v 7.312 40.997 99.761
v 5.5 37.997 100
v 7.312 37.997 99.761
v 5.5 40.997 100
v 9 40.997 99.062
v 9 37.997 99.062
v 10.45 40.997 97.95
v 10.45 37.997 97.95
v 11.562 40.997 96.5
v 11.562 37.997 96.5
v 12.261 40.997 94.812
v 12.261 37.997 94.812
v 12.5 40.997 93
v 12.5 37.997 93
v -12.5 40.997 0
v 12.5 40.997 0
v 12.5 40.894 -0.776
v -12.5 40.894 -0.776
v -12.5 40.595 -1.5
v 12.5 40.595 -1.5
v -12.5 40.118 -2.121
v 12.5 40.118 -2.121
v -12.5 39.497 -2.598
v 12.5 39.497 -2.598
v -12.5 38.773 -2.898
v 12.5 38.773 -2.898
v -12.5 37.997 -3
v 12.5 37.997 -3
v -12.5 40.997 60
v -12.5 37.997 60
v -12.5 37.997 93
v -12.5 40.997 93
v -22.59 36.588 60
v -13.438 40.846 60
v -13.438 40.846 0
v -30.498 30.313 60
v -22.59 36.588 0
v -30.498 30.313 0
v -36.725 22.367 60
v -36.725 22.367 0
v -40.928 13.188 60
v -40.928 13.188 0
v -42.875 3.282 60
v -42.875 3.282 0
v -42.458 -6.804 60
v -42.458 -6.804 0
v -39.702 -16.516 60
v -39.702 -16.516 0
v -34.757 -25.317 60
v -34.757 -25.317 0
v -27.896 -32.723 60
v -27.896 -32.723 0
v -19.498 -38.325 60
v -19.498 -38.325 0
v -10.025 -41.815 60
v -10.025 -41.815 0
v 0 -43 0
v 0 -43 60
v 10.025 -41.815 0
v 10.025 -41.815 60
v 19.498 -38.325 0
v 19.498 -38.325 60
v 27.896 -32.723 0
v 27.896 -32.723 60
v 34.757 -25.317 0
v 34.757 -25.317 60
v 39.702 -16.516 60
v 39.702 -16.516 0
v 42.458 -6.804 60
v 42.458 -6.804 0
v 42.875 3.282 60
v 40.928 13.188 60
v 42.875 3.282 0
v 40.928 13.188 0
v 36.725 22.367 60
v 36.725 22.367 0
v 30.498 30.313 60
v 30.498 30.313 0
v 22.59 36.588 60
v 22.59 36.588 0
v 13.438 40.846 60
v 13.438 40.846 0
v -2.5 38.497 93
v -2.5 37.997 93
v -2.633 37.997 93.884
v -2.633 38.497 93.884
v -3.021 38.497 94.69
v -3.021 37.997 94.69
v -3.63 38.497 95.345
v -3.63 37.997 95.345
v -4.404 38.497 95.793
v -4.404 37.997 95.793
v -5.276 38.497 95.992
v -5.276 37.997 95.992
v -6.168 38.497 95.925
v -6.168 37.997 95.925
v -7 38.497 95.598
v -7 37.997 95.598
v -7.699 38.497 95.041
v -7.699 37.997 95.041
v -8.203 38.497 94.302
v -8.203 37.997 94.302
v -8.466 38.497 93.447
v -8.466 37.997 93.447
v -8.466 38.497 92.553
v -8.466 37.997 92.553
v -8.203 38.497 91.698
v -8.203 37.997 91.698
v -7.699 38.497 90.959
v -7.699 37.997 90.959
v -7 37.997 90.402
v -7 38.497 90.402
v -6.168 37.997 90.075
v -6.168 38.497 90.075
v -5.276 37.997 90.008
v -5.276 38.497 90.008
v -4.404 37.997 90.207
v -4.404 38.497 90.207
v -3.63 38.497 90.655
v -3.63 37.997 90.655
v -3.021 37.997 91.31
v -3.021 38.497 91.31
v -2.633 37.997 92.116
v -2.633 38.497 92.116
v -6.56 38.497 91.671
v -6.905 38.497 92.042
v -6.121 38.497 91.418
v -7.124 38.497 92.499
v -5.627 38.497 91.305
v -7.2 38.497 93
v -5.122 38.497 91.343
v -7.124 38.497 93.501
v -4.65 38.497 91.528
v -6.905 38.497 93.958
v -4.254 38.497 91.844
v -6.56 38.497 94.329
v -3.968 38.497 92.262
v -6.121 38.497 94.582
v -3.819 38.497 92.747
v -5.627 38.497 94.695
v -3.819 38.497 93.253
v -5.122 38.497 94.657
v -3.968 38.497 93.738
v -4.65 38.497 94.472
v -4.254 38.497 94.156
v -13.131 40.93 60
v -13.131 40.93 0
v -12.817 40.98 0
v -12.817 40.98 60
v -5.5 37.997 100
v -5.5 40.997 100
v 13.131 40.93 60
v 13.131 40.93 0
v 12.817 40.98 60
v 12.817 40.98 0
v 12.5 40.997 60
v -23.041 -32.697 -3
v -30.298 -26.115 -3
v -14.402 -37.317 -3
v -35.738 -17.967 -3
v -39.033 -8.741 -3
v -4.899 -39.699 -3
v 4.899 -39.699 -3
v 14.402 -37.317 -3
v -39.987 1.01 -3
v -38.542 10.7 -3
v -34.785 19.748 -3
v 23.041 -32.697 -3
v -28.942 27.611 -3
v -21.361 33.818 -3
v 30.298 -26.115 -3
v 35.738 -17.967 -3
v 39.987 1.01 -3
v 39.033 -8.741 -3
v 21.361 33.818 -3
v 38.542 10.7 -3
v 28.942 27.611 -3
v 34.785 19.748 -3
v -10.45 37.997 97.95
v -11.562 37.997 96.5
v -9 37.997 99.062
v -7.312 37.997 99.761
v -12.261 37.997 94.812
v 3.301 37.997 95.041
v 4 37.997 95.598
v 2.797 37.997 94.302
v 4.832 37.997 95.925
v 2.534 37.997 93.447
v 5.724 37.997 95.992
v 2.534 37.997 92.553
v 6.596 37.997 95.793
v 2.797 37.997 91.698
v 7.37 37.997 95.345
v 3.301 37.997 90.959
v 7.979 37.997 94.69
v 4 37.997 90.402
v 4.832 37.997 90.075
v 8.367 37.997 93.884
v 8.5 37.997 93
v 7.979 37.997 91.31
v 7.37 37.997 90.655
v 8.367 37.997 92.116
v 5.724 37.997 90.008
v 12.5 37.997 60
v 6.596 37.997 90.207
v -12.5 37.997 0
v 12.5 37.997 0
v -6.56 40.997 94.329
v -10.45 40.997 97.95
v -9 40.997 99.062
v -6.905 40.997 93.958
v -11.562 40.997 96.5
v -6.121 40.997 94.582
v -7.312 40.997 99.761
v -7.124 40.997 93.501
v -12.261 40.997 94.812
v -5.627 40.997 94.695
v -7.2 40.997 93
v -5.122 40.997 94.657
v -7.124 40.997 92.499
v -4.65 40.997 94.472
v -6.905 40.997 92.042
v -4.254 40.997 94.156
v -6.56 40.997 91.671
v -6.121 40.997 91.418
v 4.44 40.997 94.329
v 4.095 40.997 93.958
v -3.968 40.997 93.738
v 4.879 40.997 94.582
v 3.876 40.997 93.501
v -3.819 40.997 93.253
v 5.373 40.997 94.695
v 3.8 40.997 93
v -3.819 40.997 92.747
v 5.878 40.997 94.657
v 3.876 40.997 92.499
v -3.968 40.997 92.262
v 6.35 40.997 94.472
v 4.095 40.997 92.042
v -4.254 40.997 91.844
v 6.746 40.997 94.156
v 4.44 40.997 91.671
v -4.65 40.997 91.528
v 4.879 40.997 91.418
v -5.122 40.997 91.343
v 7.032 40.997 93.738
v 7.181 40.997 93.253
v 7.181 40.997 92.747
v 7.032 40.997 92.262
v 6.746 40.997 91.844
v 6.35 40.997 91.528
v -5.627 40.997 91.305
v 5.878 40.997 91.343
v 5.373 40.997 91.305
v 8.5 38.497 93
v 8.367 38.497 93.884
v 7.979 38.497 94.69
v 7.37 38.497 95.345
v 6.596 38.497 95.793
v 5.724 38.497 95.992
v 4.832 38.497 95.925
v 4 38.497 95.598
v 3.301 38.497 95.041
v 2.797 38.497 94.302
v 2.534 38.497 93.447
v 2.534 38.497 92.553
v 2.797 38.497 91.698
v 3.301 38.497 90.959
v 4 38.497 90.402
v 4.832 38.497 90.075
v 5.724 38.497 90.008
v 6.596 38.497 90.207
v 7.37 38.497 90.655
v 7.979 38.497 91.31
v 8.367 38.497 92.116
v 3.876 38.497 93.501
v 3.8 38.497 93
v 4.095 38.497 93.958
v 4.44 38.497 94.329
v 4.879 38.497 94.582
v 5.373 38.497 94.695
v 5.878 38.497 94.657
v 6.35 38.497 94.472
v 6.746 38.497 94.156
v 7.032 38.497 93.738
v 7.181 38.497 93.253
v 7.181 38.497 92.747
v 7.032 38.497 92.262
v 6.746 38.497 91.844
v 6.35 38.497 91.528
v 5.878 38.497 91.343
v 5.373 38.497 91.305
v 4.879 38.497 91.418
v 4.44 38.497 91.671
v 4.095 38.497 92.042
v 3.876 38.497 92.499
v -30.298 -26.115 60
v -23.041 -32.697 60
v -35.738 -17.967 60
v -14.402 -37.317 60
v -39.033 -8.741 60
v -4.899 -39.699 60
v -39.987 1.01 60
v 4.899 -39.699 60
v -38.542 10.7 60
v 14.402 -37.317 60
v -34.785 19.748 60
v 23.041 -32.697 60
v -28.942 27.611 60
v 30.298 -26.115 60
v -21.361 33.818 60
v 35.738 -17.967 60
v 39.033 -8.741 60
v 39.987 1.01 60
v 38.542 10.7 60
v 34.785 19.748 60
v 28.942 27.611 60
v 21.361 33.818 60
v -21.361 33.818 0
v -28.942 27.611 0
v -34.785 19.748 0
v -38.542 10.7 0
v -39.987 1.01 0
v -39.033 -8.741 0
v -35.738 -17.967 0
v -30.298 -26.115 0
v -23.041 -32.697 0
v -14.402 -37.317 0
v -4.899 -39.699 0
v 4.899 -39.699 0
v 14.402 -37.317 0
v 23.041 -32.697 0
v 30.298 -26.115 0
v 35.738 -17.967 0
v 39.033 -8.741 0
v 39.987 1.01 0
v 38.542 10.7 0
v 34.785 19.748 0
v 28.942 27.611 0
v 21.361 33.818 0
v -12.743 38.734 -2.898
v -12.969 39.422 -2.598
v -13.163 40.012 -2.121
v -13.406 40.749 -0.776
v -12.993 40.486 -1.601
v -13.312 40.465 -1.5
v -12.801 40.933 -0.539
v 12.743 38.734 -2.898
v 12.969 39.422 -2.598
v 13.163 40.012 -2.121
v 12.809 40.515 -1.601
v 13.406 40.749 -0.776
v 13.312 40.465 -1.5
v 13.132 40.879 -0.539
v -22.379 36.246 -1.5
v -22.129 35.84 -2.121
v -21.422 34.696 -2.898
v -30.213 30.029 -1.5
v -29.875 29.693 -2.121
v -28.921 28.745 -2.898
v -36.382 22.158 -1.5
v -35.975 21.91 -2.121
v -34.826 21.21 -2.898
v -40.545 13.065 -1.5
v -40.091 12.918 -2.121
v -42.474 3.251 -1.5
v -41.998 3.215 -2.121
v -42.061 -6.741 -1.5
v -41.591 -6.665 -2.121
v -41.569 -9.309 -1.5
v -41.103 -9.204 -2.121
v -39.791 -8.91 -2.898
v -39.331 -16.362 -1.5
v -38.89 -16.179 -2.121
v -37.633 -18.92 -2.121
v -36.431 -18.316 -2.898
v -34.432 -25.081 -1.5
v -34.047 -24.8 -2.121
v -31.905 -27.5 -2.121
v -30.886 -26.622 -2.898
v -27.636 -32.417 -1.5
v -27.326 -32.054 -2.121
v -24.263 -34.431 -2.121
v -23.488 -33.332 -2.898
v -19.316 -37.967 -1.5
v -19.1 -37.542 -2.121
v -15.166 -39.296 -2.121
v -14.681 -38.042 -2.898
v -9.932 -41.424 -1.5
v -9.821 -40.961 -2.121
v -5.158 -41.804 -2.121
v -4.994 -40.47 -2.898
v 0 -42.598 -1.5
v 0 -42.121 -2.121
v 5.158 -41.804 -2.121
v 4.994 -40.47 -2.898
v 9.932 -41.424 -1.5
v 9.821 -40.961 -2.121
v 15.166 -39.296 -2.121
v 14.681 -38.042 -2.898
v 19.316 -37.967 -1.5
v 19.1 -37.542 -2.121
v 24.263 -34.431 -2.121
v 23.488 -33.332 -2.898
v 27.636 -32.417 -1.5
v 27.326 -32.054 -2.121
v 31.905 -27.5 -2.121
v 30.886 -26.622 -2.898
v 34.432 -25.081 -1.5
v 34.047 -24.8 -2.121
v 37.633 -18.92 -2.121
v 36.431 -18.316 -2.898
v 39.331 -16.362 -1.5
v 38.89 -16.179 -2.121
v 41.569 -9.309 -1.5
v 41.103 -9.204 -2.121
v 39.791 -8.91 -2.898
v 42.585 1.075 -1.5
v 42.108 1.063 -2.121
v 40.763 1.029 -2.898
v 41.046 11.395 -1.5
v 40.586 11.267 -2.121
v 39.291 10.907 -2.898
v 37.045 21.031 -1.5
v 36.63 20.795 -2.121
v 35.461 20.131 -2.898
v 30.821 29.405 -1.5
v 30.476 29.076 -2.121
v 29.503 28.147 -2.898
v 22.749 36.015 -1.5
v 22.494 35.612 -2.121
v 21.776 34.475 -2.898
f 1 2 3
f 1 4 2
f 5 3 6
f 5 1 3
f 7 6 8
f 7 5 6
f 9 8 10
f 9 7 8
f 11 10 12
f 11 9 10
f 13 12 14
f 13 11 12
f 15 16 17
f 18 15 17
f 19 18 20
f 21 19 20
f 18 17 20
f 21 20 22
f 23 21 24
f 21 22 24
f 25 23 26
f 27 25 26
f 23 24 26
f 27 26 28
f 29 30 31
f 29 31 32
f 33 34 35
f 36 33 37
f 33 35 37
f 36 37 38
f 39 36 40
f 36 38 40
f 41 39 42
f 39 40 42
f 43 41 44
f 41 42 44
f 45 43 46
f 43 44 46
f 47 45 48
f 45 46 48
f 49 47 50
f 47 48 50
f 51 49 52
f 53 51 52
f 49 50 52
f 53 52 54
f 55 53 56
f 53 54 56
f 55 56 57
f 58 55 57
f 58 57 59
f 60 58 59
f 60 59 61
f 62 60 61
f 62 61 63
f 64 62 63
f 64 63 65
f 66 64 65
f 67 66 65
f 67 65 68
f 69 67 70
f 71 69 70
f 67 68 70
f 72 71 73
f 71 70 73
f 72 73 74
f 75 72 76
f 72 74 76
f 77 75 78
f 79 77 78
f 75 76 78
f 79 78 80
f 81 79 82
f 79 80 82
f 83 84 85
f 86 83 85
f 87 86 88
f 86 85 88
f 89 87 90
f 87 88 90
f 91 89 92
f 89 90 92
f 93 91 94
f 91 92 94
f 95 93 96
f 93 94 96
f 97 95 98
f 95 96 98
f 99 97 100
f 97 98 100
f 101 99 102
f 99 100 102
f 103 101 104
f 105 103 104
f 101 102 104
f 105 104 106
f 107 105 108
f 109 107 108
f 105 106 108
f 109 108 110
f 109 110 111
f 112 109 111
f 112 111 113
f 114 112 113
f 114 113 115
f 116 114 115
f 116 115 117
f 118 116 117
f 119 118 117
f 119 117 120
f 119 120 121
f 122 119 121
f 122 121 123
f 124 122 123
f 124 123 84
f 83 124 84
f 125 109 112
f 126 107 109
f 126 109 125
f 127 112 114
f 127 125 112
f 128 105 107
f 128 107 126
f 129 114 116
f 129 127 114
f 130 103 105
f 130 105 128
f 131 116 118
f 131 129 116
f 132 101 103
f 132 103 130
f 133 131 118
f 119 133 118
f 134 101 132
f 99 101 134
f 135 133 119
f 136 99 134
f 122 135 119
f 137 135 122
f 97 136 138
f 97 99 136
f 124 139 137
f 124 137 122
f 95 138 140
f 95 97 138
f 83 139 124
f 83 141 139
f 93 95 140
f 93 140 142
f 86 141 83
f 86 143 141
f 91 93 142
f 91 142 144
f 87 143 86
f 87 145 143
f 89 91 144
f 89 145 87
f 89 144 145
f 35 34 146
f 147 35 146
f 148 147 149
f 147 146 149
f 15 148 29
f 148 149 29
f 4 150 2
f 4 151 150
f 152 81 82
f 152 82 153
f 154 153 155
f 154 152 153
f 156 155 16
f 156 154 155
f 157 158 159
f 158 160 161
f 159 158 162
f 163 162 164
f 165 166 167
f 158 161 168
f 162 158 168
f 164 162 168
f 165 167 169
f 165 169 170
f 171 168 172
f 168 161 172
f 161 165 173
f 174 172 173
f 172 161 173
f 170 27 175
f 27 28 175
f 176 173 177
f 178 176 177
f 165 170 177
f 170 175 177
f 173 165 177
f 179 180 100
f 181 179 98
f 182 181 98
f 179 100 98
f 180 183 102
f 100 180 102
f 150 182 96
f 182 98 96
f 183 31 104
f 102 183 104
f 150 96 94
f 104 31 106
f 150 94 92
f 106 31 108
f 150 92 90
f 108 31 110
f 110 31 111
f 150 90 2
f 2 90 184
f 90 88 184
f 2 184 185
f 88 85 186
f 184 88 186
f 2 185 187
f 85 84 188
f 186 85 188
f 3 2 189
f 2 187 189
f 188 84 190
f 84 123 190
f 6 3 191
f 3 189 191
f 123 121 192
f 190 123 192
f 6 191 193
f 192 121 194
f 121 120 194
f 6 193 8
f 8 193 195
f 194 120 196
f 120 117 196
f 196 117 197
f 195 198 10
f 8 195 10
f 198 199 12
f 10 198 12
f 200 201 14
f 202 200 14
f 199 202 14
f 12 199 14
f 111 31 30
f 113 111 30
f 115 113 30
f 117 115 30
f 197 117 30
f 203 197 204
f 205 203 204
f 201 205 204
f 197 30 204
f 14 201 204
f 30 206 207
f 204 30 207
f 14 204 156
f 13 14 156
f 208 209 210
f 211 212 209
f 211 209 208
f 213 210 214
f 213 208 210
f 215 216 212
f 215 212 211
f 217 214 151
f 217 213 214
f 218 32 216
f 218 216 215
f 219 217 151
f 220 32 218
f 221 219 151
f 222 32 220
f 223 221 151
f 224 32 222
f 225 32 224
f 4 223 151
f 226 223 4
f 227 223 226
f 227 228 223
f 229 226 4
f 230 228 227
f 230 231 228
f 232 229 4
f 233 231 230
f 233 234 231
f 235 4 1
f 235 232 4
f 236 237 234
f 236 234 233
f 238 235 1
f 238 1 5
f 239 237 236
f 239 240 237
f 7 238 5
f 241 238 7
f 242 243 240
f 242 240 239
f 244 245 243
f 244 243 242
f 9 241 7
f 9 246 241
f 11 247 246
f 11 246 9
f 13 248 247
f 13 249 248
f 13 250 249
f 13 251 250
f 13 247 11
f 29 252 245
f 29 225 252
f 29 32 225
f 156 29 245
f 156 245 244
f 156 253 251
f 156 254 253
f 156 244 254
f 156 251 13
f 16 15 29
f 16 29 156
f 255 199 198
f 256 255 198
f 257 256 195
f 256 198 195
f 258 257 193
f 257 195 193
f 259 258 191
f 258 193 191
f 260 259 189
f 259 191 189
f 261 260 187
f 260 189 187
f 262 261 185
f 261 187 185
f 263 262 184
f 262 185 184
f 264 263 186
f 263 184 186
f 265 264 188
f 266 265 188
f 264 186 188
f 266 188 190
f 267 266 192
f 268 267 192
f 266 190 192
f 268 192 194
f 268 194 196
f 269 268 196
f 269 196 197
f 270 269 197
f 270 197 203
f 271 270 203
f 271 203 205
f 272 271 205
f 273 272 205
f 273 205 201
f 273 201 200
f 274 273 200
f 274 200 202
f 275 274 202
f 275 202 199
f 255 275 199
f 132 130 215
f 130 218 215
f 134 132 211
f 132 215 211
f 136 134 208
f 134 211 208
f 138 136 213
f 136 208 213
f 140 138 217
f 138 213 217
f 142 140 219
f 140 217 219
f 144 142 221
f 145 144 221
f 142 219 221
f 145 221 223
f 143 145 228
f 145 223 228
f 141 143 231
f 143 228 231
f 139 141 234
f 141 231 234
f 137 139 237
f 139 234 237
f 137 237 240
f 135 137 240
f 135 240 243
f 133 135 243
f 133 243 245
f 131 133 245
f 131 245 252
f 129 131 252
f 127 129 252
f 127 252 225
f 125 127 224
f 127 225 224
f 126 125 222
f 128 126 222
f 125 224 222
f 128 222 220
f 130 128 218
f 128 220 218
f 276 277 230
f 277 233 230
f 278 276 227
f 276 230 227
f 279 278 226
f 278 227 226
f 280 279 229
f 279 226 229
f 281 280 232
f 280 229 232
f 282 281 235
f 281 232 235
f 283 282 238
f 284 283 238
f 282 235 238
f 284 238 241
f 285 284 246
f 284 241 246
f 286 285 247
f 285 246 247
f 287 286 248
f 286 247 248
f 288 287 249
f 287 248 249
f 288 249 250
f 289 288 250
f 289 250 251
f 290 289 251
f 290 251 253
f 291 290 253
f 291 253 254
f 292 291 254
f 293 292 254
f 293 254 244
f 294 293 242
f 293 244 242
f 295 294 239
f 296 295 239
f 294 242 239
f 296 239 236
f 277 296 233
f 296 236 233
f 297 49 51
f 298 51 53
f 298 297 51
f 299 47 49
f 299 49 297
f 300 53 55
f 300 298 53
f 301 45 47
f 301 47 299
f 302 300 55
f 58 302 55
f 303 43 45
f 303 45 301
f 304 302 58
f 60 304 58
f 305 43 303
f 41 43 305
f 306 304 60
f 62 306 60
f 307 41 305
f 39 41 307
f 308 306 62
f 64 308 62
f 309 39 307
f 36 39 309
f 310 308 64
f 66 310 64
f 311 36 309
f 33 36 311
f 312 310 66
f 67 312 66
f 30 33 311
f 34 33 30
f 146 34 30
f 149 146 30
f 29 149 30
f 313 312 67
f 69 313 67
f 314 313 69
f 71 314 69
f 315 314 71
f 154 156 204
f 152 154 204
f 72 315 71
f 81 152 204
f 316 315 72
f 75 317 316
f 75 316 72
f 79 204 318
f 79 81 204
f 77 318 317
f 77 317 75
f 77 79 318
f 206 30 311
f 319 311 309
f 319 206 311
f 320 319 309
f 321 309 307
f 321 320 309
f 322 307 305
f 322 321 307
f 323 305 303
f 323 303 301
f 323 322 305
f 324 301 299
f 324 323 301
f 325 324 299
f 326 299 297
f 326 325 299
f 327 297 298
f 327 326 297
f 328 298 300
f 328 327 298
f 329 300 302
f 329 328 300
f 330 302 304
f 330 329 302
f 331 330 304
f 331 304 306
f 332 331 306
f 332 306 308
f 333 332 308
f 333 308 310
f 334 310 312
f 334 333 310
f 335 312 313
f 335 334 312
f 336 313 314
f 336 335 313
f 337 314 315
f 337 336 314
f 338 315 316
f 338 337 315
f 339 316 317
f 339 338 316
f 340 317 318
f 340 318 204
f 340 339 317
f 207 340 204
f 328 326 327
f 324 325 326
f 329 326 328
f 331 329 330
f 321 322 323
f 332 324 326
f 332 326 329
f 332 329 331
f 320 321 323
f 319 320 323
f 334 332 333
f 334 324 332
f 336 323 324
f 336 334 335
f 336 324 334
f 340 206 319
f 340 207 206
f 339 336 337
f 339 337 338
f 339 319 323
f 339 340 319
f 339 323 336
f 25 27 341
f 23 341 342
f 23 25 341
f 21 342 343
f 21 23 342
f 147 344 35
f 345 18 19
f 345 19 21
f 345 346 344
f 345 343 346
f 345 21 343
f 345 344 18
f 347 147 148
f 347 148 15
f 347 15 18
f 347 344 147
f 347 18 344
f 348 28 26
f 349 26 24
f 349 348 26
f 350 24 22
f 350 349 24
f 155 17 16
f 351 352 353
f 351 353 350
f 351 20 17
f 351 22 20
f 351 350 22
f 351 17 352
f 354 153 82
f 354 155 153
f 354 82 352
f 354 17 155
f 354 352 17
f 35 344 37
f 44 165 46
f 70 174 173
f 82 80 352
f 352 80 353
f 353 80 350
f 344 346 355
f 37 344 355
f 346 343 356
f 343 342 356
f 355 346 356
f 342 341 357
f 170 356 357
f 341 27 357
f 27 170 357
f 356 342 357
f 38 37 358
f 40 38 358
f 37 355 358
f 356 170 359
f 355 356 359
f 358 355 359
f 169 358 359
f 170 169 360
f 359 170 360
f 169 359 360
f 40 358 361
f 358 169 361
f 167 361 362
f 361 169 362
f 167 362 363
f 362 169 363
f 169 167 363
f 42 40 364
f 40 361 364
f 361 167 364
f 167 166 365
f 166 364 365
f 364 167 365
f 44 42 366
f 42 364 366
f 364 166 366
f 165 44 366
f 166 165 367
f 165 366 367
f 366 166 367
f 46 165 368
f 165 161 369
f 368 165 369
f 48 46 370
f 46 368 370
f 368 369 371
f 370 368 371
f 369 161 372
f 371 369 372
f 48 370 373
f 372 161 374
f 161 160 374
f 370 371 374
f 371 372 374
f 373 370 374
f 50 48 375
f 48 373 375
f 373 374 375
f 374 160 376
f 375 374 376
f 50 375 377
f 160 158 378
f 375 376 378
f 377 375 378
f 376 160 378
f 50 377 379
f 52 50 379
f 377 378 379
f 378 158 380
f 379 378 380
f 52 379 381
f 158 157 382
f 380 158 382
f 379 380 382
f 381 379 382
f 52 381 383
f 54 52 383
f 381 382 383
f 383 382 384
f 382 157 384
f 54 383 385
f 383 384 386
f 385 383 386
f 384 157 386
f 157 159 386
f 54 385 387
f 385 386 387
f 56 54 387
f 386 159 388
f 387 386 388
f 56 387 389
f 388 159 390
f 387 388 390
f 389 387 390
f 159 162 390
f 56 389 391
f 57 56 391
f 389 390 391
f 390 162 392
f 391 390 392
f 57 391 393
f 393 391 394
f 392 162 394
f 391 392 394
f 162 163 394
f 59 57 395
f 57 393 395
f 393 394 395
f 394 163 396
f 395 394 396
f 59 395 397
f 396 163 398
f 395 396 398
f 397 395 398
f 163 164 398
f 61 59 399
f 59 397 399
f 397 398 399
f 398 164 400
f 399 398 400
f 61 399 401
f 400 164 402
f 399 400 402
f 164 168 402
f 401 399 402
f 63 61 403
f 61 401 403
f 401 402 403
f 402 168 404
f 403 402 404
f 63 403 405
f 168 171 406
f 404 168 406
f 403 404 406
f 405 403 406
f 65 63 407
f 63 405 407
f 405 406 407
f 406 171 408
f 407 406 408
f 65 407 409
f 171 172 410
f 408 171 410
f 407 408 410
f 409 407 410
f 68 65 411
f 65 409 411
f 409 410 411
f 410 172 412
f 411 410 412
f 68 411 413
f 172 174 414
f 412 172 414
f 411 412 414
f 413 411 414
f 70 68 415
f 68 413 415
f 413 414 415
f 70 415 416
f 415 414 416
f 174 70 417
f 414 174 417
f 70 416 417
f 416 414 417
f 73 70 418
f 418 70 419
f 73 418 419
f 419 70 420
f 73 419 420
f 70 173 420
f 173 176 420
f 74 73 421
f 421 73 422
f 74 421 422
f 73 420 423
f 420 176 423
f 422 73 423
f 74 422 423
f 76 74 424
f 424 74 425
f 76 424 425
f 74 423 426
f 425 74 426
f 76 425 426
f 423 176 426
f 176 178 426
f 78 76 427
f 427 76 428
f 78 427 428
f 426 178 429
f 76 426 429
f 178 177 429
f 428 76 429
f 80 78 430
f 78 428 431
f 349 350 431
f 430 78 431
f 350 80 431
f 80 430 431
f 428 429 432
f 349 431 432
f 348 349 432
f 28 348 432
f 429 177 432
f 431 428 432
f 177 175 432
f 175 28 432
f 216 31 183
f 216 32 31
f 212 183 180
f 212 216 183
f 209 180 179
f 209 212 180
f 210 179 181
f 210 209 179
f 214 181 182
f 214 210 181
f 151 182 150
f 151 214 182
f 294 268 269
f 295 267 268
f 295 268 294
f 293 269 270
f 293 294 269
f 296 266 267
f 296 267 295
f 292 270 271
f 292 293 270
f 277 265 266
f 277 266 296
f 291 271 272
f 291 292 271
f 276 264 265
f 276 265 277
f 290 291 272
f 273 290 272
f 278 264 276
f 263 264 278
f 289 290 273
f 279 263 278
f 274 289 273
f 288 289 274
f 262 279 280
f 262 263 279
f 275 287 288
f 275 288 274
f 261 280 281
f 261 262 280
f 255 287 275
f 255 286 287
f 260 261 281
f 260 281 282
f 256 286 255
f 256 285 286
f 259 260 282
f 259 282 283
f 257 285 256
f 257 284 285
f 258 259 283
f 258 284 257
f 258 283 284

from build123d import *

# Parameters (mm, degrees)
PAD_DEPTH        = 60
THICKNESS_T      = 3
SKETCH001_W      = 25
SKETCH001_H      = 3
PAD001_DEPTH     = 40
HOLE_D           = 3.4
HOLE_DEPTH       = 12
HOLE_CBORE_D     = 6
HOLE_CBORE_DEPTH = 0.5
FILLET_R         = 7


with BuildPart() as part:
    # Sketch → Pad (new body)
    with BuildSketch(Plane.XY):
        with BuildLine():
            ThreePointArc((-12.5, 37.99671), (0, -40), (12.5, 37.99671))
            Line((-12.5, 37.99671), (12.5, 37.99671))
        make_face()
    extrude(amount=PAD_DEPTH)

    # Thickness
    thickness_openings = [part.faces().sort_by_distance(p)[0] for p in [
        (0, -0.260782, 60),
    ]]
    offset(amount=THICKNESS_T, openings=thickness_openings)

    # Sketch001 (on Face4 of Thickness) → Pad001 (join)
    with BuildSketch(Plane.XY.offset(60)):
        with Locations((0, 39.49671)):
            Rectangle(SKETCH001_W, SKETCH001_H)
    extrude(amount=PAD001_DEPTH)

    # Hole
    with Locations(Plane.XZ.offset(-37.99671)):
        with Locations((-5.5, 93), (5.5, 93)):
            CounterBoreHole(HOLE_D / 2, HOLE_CBORE_D / 2, HOLE_CBORE_DEPTH, depth=HOLE_DEPTH)

    # Fillet
    fillet_edges = [part.edges().sort_by_distance(p)[0] for p in [
        (12.5, 39.49671, 100),
        (-12.5, 39.49671, 100),
    ]]
    fillet(fillet_edges, radius=FILLET_R)


solid = part.part
